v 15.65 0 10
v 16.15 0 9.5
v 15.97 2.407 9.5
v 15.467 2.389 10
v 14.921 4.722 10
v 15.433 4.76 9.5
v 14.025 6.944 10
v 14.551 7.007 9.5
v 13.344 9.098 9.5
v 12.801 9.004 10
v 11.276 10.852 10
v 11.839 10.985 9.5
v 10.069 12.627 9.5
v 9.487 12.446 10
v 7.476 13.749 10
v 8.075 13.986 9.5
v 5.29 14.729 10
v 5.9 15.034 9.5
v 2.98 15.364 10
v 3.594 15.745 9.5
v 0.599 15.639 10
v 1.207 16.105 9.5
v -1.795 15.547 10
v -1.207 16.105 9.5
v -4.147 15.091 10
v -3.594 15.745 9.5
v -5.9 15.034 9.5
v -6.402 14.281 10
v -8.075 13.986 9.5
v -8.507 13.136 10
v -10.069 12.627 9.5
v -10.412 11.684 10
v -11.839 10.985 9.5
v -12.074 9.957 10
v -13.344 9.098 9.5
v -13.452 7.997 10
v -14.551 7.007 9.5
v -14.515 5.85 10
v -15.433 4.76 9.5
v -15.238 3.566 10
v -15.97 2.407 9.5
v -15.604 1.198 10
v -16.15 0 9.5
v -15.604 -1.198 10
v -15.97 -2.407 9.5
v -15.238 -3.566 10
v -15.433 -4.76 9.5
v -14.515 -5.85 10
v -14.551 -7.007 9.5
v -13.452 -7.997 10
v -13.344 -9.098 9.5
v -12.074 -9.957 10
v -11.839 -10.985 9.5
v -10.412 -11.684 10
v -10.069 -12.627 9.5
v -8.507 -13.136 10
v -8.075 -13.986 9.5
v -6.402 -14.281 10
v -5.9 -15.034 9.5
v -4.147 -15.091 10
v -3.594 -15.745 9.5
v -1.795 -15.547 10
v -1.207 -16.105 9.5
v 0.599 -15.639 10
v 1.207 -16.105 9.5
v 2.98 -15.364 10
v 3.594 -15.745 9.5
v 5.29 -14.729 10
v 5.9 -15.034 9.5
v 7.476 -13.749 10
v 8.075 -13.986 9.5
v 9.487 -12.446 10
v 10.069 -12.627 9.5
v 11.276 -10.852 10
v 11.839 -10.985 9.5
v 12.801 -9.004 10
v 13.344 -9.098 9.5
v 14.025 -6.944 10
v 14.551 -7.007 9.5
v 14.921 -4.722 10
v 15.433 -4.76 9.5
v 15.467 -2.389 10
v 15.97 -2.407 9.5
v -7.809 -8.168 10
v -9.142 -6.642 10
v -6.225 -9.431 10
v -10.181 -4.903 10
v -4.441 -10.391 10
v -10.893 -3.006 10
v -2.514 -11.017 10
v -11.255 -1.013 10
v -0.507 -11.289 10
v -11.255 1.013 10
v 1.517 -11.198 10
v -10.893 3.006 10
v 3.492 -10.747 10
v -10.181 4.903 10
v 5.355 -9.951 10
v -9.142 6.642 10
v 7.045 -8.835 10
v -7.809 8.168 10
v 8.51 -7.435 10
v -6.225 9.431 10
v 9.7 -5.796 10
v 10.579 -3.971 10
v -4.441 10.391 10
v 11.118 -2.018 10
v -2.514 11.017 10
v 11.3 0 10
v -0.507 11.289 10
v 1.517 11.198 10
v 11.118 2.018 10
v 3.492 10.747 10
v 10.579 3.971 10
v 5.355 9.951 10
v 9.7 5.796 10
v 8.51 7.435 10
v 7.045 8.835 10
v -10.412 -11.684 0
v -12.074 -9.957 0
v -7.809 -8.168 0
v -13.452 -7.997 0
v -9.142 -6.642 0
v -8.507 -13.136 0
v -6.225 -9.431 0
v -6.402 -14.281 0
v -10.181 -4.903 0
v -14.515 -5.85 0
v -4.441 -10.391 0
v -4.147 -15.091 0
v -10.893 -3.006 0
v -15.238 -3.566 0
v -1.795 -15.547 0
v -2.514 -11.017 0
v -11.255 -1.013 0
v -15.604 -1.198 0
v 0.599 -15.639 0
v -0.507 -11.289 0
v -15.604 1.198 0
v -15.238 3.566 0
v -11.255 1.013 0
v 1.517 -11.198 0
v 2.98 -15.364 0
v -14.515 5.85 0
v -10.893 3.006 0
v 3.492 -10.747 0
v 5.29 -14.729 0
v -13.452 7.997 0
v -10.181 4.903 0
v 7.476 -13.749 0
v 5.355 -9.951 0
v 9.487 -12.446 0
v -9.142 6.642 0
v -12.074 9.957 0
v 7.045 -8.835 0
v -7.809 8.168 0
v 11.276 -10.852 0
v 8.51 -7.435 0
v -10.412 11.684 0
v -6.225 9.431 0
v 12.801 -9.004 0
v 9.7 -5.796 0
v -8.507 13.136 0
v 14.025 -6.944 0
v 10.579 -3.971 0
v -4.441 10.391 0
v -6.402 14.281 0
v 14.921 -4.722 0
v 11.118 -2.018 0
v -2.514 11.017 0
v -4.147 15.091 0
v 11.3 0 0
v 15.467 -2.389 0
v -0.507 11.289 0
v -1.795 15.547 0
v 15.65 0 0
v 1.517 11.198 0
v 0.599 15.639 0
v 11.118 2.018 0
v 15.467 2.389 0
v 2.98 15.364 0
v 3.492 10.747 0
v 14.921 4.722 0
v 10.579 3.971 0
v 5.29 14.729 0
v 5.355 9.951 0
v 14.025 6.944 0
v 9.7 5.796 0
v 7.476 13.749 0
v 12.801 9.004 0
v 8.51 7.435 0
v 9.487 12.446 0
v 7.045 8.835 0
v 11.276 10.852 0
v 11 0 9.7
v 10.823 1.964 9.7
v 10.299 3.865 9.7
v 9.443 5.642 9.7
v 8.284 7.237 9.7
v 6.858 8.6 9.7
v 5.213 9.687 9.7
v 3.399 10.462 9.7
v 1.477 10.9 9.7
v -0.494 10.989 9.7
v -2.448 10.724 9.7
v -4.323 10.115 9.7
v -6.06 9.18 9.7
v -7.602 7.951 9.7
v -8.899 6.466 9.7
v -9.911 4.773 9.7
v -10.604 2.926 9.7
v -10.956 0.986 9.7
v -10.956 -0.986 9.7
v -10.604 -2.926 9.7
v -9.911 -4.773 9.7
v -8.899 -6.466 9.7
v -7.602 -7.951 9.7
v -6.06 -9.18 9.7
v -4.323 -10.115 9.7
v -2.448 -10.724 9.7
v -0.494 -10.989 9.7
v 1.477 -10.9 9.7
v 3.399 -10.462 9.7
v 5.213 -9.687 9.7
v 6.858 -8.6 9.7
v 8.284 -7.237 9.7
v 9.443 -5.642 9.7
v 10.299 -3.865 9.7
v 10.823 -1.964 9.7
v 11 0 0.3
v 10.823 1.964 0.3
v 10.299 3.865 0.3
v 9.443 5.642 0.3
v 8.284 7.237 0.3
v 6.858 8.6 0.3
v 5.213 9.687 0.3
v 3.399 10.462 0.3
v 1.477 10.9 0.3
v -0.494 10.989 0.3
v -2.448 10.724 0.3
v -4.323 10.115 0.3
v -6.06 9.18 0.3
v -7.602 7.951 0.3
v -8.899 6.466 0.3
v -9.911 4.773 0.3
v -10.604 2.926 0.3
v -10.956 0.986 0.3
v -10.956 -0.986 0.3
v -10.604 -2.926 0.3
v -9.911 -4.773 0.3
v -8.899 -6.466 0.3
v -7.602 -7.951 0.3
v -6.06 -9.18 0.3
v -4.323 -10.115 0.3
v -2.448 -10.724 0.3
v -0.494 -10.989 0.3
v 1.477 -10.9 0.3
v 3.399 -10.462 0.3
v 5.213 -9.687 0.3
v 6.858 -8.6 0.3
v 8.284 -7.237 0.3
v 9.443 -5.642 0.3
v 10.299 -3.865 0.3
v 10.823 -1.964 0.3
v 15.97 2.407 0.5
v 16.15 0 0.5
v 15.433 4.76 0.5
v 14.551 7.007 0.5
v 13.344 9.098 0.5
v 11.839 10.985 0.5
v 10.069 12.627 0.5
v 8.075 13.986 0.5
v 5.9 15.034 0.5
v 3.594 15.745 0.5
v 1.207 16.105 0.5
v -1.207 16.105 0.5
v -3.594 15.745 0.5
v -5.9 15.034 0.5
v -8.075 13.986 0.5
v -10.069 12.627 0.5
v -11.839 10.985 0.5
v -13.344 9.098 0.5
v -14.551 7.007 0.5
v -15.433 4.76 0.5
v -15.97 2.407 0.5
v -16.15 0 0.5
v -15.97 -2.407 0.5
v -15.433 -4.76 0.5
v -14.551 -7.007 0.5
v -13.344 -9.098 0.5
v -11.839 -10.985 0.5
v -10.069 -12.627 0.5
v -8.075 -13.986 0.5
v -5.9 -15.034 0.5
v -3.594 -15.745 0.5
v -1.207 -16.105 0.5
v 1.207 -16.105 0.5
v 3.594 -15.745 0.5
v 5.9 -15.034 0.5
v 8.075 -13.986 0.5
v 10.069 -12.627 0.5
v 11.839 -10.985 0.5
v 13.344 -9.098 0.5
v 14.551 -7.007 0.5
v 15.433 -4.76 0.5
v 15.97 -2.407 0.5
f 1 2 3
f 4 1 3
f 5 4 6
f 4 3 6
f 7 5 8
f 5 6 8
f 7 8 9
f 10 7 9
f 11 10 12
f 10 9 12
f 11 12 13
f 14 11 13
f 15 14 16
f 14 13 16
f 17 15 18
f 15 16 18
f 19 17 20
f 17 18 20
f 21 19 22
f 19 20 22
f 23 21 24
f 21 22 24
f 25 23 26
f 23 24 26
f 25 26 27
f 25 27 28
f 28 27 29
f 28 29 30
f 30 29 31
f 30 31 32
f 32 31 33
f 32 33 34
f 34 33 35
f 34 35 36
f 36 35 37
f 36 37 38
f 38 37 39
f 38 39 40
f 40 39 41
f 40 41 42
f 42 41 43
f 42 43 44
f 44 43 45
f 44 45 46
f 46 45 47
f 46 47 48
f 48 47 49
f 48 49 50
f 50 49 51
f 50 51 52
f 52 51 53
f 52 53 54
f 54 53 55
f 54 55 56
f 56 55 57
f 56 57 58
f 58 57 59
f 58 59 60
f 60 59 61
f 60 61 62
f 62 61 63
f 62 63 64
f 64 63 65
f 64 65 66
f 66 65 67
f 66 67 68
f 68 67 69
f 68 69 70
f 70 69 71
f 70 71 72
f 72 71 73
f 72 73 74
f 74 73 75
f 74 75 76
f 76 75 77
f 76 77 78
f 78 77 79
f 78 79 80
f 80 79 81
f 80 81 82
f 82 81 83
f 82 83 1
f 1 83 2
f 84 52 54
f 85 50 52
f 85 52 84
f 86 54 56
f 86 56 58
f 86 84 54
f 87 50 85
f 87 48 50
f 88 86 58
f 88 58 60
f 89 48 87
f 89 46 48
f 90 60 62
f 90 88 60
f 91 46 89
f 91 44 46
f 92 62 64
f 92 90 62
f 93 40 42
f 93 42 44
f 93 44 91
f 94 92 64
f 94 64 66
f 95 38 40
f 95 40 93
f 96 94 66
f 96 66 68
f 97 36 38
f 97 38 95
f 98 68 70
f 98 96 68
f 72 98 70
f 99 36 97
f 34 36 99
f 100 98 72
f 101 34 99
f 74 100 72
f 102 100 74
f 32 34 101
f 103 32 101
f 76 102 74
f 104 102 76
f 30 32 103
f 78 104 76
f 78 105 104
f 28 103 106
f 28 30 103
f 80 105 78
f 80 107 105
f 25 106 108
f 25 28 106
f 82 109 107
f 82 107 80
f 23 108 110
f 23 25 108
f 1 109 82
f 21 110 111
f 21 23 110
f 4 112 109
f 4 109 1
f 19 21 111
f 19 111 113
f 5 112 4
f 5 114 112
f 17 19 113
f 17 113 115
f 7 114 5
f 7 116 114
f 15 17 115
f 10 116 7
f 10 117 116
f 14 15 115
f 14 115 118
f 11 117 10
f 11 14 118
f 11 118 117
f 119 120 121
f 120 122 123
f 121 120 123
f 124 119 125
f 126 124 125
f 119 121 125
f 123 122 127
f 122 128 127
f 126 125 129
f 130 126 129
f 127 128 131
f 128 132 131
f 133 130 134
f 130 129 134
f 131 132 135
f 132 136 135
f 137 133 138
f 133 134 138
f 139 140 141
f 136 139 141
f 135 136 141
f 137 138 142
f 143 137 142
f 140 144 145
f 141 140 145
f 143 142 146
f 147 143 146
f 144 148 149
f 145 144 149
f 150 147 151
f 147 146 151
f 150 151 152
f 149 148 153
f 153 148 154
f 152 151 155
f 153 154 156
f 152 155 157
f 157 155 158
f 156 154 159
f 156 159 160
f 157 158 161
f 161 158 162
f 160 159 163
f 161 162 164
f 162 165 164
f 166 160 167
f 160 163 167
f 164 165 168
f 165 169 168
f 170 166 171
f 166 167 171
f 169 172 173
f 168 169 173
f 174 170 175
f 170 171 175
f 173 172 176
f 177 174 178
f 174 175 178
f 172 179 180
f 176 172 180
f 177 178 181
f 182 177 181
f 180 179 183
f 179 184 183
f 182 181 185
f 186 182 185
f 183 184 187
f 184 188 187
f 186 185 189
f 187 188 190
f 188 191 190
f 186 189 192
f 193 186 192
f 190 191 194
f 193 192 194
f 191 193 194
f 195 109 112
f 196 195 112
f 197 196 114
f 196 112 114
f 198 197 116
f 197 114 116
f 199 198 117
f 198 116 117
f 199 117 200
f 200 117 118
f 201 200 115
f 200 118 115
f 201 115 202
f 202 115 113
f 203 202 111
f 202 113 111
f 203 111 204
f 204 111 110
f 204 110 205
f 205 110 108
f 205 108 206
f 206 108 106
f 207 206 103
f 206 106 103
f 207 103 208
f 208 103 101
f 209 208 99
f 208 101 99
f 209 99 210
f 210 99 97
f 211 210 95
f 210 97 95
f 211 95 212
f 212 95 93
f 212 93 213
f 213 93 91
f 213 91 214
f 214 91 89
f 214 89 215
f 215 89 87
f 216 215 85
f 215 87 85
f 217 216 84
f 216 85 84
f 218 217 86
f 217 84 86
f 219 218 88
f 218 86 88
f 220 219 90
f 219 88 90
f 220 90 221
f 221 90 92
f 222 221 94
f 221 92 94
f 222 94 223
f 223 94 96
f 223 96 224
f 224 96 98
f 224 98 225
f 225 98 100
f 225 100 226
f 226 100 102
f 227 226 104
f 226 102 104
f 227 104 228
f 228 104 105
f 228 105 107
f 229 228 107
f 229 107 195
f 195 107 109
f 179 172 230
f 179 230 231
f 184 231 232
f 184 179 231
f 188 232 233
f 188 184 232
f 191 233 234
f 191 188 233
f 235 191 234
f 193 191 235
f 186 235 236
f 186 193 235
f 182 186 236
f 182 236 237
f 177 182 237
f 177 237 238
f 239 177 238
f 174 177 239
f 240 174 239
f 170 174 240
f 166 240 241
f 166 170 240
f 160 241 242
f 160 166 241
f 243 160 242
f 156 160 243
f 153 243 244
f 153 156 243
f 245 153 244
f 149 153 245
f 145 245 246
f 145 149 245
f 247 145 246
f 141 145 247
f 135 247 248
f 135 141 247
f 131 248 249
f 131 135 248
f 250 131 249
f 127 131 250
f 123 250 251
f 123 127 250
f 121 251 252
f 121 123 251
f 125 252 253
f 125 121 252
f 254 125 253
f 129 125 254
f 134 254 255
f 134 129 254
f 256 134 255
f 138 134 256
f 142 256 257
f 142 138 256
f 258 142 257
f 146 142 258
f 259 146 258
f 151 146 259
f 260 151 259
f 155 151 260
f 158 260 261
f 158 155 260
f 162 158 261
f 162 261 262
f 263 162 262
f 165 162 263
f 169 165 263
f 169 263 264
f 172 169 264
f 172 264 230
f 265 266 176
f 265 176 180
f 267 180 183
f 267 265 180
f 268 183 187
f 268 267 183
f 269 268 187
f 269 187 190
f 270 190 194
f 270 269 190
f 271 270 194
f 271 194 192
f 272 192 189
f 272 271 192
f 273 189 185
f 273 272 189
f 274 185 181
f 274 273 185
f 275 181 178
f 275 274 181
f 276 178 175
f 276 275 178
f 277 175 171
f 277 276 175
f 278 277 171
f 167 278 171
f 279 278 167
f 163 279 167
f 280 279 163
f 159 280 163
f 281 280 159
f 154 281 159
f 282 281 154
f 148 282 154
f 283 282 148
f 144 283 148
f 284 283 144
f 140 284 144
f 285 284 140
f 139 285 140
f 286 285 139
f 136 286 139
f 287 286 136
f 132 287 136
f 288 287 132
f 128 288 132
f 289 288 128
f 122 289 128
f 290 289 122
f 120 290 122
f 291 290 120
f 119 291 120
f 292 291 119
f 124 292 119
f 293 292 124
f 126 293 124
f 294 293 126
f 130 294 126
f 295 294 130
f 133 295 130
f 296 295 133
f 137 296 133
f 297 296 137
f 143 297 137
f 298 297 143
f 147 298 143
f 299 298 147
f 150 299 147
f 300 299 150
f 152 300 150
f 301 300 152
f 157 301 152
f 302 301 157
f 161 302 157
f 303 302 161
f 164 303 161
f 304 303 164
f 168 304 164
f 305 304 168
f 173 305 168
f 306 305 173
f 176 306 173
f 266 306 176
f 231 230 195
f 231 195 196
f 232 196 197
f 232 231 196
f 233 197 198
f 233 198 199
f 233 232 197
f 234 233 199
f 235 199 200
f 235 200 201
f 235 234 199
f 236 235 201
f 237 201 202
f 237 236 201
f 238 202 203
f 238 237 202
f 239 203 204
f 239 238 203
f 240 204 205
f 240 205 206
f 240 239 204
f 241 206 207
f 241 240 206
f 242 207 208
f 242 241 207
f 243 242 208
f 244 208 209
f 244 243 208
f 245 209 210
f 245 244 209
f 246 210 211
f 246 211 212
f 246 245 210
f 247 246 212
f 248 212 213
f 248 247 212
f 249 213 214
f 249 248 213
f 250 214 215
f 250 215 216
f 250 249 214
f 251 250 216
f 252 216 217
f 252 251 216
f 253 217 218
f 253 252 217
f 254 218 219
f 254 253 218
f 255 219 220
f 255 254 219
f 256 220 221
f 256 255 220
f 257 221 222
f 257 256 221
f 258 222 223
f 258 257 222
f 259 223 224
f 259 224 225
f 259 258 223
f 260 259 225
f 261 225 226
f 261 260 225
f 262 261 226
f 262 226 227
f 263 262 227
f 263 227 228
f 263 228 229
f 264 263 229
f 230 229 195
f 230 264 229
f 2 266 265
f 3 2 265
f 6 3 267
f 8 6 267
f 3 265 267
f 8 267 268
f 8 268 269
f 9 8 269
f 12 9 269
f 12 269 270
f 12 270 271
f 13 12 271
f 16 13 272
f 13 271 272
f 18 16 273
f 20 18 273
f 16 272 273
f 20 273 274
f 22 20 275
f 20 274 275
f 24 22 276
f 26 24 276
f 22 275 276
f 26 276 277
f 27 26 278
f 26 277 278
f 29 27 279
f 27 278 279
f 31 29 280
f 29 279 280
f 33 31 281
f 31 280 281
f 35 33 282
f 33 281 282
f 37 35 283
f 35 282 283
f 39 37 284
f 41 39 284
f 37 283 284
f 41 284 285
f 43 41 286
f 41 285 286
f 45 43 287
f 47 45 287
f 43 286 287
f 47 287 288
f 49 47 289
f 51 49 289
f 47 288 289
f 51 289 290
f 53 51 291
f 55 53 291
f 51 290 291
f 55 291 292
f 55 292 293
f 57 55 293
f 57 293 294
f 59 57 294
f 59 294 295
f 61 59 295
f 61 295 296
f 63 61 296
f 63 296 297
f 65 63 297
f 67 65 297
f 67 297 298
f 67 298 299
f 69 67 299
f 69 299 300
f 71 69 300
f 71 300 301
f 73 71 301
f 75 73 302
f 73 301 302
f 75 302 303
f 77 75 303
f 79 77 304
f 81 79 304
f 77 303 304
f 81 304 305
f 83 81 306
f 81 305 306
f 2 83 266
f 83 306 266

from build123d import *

# Parameters (mm, degrees)
F0_R     = 16.15
F0_R_2   = 11
F1_DEPTH = 10
F2_SIZE  = 0.3
F3_SIZE  = 0.5


with BuildPart() as f1:
    # F0 (on Top) → F1 (new body)
    with BuildSketch(Plane.XY):
        Circle(F0_R)
        Circle(F0_R_2, mode=Mode.SUBTRACT)
    extrude(amount=F1_DEPTH)

    # F2
    f2_edges = [f1.edges().sort_by_distance(p)[0] for p in [
        (-11, 0, 10),
        (-11, 0, 0),
    ]]
    chamfer(f2_edges, length=F2_SIZE)

    # F3
    f3_edges = [f1.edges().sort_by_distance(p)[0] for p in [
        (-16.15, 0, 10),
        (-16.15, 0, 0),
    ]]
    chamfer(f3_edges, length=F3_SIZE)


solid = f1.part
